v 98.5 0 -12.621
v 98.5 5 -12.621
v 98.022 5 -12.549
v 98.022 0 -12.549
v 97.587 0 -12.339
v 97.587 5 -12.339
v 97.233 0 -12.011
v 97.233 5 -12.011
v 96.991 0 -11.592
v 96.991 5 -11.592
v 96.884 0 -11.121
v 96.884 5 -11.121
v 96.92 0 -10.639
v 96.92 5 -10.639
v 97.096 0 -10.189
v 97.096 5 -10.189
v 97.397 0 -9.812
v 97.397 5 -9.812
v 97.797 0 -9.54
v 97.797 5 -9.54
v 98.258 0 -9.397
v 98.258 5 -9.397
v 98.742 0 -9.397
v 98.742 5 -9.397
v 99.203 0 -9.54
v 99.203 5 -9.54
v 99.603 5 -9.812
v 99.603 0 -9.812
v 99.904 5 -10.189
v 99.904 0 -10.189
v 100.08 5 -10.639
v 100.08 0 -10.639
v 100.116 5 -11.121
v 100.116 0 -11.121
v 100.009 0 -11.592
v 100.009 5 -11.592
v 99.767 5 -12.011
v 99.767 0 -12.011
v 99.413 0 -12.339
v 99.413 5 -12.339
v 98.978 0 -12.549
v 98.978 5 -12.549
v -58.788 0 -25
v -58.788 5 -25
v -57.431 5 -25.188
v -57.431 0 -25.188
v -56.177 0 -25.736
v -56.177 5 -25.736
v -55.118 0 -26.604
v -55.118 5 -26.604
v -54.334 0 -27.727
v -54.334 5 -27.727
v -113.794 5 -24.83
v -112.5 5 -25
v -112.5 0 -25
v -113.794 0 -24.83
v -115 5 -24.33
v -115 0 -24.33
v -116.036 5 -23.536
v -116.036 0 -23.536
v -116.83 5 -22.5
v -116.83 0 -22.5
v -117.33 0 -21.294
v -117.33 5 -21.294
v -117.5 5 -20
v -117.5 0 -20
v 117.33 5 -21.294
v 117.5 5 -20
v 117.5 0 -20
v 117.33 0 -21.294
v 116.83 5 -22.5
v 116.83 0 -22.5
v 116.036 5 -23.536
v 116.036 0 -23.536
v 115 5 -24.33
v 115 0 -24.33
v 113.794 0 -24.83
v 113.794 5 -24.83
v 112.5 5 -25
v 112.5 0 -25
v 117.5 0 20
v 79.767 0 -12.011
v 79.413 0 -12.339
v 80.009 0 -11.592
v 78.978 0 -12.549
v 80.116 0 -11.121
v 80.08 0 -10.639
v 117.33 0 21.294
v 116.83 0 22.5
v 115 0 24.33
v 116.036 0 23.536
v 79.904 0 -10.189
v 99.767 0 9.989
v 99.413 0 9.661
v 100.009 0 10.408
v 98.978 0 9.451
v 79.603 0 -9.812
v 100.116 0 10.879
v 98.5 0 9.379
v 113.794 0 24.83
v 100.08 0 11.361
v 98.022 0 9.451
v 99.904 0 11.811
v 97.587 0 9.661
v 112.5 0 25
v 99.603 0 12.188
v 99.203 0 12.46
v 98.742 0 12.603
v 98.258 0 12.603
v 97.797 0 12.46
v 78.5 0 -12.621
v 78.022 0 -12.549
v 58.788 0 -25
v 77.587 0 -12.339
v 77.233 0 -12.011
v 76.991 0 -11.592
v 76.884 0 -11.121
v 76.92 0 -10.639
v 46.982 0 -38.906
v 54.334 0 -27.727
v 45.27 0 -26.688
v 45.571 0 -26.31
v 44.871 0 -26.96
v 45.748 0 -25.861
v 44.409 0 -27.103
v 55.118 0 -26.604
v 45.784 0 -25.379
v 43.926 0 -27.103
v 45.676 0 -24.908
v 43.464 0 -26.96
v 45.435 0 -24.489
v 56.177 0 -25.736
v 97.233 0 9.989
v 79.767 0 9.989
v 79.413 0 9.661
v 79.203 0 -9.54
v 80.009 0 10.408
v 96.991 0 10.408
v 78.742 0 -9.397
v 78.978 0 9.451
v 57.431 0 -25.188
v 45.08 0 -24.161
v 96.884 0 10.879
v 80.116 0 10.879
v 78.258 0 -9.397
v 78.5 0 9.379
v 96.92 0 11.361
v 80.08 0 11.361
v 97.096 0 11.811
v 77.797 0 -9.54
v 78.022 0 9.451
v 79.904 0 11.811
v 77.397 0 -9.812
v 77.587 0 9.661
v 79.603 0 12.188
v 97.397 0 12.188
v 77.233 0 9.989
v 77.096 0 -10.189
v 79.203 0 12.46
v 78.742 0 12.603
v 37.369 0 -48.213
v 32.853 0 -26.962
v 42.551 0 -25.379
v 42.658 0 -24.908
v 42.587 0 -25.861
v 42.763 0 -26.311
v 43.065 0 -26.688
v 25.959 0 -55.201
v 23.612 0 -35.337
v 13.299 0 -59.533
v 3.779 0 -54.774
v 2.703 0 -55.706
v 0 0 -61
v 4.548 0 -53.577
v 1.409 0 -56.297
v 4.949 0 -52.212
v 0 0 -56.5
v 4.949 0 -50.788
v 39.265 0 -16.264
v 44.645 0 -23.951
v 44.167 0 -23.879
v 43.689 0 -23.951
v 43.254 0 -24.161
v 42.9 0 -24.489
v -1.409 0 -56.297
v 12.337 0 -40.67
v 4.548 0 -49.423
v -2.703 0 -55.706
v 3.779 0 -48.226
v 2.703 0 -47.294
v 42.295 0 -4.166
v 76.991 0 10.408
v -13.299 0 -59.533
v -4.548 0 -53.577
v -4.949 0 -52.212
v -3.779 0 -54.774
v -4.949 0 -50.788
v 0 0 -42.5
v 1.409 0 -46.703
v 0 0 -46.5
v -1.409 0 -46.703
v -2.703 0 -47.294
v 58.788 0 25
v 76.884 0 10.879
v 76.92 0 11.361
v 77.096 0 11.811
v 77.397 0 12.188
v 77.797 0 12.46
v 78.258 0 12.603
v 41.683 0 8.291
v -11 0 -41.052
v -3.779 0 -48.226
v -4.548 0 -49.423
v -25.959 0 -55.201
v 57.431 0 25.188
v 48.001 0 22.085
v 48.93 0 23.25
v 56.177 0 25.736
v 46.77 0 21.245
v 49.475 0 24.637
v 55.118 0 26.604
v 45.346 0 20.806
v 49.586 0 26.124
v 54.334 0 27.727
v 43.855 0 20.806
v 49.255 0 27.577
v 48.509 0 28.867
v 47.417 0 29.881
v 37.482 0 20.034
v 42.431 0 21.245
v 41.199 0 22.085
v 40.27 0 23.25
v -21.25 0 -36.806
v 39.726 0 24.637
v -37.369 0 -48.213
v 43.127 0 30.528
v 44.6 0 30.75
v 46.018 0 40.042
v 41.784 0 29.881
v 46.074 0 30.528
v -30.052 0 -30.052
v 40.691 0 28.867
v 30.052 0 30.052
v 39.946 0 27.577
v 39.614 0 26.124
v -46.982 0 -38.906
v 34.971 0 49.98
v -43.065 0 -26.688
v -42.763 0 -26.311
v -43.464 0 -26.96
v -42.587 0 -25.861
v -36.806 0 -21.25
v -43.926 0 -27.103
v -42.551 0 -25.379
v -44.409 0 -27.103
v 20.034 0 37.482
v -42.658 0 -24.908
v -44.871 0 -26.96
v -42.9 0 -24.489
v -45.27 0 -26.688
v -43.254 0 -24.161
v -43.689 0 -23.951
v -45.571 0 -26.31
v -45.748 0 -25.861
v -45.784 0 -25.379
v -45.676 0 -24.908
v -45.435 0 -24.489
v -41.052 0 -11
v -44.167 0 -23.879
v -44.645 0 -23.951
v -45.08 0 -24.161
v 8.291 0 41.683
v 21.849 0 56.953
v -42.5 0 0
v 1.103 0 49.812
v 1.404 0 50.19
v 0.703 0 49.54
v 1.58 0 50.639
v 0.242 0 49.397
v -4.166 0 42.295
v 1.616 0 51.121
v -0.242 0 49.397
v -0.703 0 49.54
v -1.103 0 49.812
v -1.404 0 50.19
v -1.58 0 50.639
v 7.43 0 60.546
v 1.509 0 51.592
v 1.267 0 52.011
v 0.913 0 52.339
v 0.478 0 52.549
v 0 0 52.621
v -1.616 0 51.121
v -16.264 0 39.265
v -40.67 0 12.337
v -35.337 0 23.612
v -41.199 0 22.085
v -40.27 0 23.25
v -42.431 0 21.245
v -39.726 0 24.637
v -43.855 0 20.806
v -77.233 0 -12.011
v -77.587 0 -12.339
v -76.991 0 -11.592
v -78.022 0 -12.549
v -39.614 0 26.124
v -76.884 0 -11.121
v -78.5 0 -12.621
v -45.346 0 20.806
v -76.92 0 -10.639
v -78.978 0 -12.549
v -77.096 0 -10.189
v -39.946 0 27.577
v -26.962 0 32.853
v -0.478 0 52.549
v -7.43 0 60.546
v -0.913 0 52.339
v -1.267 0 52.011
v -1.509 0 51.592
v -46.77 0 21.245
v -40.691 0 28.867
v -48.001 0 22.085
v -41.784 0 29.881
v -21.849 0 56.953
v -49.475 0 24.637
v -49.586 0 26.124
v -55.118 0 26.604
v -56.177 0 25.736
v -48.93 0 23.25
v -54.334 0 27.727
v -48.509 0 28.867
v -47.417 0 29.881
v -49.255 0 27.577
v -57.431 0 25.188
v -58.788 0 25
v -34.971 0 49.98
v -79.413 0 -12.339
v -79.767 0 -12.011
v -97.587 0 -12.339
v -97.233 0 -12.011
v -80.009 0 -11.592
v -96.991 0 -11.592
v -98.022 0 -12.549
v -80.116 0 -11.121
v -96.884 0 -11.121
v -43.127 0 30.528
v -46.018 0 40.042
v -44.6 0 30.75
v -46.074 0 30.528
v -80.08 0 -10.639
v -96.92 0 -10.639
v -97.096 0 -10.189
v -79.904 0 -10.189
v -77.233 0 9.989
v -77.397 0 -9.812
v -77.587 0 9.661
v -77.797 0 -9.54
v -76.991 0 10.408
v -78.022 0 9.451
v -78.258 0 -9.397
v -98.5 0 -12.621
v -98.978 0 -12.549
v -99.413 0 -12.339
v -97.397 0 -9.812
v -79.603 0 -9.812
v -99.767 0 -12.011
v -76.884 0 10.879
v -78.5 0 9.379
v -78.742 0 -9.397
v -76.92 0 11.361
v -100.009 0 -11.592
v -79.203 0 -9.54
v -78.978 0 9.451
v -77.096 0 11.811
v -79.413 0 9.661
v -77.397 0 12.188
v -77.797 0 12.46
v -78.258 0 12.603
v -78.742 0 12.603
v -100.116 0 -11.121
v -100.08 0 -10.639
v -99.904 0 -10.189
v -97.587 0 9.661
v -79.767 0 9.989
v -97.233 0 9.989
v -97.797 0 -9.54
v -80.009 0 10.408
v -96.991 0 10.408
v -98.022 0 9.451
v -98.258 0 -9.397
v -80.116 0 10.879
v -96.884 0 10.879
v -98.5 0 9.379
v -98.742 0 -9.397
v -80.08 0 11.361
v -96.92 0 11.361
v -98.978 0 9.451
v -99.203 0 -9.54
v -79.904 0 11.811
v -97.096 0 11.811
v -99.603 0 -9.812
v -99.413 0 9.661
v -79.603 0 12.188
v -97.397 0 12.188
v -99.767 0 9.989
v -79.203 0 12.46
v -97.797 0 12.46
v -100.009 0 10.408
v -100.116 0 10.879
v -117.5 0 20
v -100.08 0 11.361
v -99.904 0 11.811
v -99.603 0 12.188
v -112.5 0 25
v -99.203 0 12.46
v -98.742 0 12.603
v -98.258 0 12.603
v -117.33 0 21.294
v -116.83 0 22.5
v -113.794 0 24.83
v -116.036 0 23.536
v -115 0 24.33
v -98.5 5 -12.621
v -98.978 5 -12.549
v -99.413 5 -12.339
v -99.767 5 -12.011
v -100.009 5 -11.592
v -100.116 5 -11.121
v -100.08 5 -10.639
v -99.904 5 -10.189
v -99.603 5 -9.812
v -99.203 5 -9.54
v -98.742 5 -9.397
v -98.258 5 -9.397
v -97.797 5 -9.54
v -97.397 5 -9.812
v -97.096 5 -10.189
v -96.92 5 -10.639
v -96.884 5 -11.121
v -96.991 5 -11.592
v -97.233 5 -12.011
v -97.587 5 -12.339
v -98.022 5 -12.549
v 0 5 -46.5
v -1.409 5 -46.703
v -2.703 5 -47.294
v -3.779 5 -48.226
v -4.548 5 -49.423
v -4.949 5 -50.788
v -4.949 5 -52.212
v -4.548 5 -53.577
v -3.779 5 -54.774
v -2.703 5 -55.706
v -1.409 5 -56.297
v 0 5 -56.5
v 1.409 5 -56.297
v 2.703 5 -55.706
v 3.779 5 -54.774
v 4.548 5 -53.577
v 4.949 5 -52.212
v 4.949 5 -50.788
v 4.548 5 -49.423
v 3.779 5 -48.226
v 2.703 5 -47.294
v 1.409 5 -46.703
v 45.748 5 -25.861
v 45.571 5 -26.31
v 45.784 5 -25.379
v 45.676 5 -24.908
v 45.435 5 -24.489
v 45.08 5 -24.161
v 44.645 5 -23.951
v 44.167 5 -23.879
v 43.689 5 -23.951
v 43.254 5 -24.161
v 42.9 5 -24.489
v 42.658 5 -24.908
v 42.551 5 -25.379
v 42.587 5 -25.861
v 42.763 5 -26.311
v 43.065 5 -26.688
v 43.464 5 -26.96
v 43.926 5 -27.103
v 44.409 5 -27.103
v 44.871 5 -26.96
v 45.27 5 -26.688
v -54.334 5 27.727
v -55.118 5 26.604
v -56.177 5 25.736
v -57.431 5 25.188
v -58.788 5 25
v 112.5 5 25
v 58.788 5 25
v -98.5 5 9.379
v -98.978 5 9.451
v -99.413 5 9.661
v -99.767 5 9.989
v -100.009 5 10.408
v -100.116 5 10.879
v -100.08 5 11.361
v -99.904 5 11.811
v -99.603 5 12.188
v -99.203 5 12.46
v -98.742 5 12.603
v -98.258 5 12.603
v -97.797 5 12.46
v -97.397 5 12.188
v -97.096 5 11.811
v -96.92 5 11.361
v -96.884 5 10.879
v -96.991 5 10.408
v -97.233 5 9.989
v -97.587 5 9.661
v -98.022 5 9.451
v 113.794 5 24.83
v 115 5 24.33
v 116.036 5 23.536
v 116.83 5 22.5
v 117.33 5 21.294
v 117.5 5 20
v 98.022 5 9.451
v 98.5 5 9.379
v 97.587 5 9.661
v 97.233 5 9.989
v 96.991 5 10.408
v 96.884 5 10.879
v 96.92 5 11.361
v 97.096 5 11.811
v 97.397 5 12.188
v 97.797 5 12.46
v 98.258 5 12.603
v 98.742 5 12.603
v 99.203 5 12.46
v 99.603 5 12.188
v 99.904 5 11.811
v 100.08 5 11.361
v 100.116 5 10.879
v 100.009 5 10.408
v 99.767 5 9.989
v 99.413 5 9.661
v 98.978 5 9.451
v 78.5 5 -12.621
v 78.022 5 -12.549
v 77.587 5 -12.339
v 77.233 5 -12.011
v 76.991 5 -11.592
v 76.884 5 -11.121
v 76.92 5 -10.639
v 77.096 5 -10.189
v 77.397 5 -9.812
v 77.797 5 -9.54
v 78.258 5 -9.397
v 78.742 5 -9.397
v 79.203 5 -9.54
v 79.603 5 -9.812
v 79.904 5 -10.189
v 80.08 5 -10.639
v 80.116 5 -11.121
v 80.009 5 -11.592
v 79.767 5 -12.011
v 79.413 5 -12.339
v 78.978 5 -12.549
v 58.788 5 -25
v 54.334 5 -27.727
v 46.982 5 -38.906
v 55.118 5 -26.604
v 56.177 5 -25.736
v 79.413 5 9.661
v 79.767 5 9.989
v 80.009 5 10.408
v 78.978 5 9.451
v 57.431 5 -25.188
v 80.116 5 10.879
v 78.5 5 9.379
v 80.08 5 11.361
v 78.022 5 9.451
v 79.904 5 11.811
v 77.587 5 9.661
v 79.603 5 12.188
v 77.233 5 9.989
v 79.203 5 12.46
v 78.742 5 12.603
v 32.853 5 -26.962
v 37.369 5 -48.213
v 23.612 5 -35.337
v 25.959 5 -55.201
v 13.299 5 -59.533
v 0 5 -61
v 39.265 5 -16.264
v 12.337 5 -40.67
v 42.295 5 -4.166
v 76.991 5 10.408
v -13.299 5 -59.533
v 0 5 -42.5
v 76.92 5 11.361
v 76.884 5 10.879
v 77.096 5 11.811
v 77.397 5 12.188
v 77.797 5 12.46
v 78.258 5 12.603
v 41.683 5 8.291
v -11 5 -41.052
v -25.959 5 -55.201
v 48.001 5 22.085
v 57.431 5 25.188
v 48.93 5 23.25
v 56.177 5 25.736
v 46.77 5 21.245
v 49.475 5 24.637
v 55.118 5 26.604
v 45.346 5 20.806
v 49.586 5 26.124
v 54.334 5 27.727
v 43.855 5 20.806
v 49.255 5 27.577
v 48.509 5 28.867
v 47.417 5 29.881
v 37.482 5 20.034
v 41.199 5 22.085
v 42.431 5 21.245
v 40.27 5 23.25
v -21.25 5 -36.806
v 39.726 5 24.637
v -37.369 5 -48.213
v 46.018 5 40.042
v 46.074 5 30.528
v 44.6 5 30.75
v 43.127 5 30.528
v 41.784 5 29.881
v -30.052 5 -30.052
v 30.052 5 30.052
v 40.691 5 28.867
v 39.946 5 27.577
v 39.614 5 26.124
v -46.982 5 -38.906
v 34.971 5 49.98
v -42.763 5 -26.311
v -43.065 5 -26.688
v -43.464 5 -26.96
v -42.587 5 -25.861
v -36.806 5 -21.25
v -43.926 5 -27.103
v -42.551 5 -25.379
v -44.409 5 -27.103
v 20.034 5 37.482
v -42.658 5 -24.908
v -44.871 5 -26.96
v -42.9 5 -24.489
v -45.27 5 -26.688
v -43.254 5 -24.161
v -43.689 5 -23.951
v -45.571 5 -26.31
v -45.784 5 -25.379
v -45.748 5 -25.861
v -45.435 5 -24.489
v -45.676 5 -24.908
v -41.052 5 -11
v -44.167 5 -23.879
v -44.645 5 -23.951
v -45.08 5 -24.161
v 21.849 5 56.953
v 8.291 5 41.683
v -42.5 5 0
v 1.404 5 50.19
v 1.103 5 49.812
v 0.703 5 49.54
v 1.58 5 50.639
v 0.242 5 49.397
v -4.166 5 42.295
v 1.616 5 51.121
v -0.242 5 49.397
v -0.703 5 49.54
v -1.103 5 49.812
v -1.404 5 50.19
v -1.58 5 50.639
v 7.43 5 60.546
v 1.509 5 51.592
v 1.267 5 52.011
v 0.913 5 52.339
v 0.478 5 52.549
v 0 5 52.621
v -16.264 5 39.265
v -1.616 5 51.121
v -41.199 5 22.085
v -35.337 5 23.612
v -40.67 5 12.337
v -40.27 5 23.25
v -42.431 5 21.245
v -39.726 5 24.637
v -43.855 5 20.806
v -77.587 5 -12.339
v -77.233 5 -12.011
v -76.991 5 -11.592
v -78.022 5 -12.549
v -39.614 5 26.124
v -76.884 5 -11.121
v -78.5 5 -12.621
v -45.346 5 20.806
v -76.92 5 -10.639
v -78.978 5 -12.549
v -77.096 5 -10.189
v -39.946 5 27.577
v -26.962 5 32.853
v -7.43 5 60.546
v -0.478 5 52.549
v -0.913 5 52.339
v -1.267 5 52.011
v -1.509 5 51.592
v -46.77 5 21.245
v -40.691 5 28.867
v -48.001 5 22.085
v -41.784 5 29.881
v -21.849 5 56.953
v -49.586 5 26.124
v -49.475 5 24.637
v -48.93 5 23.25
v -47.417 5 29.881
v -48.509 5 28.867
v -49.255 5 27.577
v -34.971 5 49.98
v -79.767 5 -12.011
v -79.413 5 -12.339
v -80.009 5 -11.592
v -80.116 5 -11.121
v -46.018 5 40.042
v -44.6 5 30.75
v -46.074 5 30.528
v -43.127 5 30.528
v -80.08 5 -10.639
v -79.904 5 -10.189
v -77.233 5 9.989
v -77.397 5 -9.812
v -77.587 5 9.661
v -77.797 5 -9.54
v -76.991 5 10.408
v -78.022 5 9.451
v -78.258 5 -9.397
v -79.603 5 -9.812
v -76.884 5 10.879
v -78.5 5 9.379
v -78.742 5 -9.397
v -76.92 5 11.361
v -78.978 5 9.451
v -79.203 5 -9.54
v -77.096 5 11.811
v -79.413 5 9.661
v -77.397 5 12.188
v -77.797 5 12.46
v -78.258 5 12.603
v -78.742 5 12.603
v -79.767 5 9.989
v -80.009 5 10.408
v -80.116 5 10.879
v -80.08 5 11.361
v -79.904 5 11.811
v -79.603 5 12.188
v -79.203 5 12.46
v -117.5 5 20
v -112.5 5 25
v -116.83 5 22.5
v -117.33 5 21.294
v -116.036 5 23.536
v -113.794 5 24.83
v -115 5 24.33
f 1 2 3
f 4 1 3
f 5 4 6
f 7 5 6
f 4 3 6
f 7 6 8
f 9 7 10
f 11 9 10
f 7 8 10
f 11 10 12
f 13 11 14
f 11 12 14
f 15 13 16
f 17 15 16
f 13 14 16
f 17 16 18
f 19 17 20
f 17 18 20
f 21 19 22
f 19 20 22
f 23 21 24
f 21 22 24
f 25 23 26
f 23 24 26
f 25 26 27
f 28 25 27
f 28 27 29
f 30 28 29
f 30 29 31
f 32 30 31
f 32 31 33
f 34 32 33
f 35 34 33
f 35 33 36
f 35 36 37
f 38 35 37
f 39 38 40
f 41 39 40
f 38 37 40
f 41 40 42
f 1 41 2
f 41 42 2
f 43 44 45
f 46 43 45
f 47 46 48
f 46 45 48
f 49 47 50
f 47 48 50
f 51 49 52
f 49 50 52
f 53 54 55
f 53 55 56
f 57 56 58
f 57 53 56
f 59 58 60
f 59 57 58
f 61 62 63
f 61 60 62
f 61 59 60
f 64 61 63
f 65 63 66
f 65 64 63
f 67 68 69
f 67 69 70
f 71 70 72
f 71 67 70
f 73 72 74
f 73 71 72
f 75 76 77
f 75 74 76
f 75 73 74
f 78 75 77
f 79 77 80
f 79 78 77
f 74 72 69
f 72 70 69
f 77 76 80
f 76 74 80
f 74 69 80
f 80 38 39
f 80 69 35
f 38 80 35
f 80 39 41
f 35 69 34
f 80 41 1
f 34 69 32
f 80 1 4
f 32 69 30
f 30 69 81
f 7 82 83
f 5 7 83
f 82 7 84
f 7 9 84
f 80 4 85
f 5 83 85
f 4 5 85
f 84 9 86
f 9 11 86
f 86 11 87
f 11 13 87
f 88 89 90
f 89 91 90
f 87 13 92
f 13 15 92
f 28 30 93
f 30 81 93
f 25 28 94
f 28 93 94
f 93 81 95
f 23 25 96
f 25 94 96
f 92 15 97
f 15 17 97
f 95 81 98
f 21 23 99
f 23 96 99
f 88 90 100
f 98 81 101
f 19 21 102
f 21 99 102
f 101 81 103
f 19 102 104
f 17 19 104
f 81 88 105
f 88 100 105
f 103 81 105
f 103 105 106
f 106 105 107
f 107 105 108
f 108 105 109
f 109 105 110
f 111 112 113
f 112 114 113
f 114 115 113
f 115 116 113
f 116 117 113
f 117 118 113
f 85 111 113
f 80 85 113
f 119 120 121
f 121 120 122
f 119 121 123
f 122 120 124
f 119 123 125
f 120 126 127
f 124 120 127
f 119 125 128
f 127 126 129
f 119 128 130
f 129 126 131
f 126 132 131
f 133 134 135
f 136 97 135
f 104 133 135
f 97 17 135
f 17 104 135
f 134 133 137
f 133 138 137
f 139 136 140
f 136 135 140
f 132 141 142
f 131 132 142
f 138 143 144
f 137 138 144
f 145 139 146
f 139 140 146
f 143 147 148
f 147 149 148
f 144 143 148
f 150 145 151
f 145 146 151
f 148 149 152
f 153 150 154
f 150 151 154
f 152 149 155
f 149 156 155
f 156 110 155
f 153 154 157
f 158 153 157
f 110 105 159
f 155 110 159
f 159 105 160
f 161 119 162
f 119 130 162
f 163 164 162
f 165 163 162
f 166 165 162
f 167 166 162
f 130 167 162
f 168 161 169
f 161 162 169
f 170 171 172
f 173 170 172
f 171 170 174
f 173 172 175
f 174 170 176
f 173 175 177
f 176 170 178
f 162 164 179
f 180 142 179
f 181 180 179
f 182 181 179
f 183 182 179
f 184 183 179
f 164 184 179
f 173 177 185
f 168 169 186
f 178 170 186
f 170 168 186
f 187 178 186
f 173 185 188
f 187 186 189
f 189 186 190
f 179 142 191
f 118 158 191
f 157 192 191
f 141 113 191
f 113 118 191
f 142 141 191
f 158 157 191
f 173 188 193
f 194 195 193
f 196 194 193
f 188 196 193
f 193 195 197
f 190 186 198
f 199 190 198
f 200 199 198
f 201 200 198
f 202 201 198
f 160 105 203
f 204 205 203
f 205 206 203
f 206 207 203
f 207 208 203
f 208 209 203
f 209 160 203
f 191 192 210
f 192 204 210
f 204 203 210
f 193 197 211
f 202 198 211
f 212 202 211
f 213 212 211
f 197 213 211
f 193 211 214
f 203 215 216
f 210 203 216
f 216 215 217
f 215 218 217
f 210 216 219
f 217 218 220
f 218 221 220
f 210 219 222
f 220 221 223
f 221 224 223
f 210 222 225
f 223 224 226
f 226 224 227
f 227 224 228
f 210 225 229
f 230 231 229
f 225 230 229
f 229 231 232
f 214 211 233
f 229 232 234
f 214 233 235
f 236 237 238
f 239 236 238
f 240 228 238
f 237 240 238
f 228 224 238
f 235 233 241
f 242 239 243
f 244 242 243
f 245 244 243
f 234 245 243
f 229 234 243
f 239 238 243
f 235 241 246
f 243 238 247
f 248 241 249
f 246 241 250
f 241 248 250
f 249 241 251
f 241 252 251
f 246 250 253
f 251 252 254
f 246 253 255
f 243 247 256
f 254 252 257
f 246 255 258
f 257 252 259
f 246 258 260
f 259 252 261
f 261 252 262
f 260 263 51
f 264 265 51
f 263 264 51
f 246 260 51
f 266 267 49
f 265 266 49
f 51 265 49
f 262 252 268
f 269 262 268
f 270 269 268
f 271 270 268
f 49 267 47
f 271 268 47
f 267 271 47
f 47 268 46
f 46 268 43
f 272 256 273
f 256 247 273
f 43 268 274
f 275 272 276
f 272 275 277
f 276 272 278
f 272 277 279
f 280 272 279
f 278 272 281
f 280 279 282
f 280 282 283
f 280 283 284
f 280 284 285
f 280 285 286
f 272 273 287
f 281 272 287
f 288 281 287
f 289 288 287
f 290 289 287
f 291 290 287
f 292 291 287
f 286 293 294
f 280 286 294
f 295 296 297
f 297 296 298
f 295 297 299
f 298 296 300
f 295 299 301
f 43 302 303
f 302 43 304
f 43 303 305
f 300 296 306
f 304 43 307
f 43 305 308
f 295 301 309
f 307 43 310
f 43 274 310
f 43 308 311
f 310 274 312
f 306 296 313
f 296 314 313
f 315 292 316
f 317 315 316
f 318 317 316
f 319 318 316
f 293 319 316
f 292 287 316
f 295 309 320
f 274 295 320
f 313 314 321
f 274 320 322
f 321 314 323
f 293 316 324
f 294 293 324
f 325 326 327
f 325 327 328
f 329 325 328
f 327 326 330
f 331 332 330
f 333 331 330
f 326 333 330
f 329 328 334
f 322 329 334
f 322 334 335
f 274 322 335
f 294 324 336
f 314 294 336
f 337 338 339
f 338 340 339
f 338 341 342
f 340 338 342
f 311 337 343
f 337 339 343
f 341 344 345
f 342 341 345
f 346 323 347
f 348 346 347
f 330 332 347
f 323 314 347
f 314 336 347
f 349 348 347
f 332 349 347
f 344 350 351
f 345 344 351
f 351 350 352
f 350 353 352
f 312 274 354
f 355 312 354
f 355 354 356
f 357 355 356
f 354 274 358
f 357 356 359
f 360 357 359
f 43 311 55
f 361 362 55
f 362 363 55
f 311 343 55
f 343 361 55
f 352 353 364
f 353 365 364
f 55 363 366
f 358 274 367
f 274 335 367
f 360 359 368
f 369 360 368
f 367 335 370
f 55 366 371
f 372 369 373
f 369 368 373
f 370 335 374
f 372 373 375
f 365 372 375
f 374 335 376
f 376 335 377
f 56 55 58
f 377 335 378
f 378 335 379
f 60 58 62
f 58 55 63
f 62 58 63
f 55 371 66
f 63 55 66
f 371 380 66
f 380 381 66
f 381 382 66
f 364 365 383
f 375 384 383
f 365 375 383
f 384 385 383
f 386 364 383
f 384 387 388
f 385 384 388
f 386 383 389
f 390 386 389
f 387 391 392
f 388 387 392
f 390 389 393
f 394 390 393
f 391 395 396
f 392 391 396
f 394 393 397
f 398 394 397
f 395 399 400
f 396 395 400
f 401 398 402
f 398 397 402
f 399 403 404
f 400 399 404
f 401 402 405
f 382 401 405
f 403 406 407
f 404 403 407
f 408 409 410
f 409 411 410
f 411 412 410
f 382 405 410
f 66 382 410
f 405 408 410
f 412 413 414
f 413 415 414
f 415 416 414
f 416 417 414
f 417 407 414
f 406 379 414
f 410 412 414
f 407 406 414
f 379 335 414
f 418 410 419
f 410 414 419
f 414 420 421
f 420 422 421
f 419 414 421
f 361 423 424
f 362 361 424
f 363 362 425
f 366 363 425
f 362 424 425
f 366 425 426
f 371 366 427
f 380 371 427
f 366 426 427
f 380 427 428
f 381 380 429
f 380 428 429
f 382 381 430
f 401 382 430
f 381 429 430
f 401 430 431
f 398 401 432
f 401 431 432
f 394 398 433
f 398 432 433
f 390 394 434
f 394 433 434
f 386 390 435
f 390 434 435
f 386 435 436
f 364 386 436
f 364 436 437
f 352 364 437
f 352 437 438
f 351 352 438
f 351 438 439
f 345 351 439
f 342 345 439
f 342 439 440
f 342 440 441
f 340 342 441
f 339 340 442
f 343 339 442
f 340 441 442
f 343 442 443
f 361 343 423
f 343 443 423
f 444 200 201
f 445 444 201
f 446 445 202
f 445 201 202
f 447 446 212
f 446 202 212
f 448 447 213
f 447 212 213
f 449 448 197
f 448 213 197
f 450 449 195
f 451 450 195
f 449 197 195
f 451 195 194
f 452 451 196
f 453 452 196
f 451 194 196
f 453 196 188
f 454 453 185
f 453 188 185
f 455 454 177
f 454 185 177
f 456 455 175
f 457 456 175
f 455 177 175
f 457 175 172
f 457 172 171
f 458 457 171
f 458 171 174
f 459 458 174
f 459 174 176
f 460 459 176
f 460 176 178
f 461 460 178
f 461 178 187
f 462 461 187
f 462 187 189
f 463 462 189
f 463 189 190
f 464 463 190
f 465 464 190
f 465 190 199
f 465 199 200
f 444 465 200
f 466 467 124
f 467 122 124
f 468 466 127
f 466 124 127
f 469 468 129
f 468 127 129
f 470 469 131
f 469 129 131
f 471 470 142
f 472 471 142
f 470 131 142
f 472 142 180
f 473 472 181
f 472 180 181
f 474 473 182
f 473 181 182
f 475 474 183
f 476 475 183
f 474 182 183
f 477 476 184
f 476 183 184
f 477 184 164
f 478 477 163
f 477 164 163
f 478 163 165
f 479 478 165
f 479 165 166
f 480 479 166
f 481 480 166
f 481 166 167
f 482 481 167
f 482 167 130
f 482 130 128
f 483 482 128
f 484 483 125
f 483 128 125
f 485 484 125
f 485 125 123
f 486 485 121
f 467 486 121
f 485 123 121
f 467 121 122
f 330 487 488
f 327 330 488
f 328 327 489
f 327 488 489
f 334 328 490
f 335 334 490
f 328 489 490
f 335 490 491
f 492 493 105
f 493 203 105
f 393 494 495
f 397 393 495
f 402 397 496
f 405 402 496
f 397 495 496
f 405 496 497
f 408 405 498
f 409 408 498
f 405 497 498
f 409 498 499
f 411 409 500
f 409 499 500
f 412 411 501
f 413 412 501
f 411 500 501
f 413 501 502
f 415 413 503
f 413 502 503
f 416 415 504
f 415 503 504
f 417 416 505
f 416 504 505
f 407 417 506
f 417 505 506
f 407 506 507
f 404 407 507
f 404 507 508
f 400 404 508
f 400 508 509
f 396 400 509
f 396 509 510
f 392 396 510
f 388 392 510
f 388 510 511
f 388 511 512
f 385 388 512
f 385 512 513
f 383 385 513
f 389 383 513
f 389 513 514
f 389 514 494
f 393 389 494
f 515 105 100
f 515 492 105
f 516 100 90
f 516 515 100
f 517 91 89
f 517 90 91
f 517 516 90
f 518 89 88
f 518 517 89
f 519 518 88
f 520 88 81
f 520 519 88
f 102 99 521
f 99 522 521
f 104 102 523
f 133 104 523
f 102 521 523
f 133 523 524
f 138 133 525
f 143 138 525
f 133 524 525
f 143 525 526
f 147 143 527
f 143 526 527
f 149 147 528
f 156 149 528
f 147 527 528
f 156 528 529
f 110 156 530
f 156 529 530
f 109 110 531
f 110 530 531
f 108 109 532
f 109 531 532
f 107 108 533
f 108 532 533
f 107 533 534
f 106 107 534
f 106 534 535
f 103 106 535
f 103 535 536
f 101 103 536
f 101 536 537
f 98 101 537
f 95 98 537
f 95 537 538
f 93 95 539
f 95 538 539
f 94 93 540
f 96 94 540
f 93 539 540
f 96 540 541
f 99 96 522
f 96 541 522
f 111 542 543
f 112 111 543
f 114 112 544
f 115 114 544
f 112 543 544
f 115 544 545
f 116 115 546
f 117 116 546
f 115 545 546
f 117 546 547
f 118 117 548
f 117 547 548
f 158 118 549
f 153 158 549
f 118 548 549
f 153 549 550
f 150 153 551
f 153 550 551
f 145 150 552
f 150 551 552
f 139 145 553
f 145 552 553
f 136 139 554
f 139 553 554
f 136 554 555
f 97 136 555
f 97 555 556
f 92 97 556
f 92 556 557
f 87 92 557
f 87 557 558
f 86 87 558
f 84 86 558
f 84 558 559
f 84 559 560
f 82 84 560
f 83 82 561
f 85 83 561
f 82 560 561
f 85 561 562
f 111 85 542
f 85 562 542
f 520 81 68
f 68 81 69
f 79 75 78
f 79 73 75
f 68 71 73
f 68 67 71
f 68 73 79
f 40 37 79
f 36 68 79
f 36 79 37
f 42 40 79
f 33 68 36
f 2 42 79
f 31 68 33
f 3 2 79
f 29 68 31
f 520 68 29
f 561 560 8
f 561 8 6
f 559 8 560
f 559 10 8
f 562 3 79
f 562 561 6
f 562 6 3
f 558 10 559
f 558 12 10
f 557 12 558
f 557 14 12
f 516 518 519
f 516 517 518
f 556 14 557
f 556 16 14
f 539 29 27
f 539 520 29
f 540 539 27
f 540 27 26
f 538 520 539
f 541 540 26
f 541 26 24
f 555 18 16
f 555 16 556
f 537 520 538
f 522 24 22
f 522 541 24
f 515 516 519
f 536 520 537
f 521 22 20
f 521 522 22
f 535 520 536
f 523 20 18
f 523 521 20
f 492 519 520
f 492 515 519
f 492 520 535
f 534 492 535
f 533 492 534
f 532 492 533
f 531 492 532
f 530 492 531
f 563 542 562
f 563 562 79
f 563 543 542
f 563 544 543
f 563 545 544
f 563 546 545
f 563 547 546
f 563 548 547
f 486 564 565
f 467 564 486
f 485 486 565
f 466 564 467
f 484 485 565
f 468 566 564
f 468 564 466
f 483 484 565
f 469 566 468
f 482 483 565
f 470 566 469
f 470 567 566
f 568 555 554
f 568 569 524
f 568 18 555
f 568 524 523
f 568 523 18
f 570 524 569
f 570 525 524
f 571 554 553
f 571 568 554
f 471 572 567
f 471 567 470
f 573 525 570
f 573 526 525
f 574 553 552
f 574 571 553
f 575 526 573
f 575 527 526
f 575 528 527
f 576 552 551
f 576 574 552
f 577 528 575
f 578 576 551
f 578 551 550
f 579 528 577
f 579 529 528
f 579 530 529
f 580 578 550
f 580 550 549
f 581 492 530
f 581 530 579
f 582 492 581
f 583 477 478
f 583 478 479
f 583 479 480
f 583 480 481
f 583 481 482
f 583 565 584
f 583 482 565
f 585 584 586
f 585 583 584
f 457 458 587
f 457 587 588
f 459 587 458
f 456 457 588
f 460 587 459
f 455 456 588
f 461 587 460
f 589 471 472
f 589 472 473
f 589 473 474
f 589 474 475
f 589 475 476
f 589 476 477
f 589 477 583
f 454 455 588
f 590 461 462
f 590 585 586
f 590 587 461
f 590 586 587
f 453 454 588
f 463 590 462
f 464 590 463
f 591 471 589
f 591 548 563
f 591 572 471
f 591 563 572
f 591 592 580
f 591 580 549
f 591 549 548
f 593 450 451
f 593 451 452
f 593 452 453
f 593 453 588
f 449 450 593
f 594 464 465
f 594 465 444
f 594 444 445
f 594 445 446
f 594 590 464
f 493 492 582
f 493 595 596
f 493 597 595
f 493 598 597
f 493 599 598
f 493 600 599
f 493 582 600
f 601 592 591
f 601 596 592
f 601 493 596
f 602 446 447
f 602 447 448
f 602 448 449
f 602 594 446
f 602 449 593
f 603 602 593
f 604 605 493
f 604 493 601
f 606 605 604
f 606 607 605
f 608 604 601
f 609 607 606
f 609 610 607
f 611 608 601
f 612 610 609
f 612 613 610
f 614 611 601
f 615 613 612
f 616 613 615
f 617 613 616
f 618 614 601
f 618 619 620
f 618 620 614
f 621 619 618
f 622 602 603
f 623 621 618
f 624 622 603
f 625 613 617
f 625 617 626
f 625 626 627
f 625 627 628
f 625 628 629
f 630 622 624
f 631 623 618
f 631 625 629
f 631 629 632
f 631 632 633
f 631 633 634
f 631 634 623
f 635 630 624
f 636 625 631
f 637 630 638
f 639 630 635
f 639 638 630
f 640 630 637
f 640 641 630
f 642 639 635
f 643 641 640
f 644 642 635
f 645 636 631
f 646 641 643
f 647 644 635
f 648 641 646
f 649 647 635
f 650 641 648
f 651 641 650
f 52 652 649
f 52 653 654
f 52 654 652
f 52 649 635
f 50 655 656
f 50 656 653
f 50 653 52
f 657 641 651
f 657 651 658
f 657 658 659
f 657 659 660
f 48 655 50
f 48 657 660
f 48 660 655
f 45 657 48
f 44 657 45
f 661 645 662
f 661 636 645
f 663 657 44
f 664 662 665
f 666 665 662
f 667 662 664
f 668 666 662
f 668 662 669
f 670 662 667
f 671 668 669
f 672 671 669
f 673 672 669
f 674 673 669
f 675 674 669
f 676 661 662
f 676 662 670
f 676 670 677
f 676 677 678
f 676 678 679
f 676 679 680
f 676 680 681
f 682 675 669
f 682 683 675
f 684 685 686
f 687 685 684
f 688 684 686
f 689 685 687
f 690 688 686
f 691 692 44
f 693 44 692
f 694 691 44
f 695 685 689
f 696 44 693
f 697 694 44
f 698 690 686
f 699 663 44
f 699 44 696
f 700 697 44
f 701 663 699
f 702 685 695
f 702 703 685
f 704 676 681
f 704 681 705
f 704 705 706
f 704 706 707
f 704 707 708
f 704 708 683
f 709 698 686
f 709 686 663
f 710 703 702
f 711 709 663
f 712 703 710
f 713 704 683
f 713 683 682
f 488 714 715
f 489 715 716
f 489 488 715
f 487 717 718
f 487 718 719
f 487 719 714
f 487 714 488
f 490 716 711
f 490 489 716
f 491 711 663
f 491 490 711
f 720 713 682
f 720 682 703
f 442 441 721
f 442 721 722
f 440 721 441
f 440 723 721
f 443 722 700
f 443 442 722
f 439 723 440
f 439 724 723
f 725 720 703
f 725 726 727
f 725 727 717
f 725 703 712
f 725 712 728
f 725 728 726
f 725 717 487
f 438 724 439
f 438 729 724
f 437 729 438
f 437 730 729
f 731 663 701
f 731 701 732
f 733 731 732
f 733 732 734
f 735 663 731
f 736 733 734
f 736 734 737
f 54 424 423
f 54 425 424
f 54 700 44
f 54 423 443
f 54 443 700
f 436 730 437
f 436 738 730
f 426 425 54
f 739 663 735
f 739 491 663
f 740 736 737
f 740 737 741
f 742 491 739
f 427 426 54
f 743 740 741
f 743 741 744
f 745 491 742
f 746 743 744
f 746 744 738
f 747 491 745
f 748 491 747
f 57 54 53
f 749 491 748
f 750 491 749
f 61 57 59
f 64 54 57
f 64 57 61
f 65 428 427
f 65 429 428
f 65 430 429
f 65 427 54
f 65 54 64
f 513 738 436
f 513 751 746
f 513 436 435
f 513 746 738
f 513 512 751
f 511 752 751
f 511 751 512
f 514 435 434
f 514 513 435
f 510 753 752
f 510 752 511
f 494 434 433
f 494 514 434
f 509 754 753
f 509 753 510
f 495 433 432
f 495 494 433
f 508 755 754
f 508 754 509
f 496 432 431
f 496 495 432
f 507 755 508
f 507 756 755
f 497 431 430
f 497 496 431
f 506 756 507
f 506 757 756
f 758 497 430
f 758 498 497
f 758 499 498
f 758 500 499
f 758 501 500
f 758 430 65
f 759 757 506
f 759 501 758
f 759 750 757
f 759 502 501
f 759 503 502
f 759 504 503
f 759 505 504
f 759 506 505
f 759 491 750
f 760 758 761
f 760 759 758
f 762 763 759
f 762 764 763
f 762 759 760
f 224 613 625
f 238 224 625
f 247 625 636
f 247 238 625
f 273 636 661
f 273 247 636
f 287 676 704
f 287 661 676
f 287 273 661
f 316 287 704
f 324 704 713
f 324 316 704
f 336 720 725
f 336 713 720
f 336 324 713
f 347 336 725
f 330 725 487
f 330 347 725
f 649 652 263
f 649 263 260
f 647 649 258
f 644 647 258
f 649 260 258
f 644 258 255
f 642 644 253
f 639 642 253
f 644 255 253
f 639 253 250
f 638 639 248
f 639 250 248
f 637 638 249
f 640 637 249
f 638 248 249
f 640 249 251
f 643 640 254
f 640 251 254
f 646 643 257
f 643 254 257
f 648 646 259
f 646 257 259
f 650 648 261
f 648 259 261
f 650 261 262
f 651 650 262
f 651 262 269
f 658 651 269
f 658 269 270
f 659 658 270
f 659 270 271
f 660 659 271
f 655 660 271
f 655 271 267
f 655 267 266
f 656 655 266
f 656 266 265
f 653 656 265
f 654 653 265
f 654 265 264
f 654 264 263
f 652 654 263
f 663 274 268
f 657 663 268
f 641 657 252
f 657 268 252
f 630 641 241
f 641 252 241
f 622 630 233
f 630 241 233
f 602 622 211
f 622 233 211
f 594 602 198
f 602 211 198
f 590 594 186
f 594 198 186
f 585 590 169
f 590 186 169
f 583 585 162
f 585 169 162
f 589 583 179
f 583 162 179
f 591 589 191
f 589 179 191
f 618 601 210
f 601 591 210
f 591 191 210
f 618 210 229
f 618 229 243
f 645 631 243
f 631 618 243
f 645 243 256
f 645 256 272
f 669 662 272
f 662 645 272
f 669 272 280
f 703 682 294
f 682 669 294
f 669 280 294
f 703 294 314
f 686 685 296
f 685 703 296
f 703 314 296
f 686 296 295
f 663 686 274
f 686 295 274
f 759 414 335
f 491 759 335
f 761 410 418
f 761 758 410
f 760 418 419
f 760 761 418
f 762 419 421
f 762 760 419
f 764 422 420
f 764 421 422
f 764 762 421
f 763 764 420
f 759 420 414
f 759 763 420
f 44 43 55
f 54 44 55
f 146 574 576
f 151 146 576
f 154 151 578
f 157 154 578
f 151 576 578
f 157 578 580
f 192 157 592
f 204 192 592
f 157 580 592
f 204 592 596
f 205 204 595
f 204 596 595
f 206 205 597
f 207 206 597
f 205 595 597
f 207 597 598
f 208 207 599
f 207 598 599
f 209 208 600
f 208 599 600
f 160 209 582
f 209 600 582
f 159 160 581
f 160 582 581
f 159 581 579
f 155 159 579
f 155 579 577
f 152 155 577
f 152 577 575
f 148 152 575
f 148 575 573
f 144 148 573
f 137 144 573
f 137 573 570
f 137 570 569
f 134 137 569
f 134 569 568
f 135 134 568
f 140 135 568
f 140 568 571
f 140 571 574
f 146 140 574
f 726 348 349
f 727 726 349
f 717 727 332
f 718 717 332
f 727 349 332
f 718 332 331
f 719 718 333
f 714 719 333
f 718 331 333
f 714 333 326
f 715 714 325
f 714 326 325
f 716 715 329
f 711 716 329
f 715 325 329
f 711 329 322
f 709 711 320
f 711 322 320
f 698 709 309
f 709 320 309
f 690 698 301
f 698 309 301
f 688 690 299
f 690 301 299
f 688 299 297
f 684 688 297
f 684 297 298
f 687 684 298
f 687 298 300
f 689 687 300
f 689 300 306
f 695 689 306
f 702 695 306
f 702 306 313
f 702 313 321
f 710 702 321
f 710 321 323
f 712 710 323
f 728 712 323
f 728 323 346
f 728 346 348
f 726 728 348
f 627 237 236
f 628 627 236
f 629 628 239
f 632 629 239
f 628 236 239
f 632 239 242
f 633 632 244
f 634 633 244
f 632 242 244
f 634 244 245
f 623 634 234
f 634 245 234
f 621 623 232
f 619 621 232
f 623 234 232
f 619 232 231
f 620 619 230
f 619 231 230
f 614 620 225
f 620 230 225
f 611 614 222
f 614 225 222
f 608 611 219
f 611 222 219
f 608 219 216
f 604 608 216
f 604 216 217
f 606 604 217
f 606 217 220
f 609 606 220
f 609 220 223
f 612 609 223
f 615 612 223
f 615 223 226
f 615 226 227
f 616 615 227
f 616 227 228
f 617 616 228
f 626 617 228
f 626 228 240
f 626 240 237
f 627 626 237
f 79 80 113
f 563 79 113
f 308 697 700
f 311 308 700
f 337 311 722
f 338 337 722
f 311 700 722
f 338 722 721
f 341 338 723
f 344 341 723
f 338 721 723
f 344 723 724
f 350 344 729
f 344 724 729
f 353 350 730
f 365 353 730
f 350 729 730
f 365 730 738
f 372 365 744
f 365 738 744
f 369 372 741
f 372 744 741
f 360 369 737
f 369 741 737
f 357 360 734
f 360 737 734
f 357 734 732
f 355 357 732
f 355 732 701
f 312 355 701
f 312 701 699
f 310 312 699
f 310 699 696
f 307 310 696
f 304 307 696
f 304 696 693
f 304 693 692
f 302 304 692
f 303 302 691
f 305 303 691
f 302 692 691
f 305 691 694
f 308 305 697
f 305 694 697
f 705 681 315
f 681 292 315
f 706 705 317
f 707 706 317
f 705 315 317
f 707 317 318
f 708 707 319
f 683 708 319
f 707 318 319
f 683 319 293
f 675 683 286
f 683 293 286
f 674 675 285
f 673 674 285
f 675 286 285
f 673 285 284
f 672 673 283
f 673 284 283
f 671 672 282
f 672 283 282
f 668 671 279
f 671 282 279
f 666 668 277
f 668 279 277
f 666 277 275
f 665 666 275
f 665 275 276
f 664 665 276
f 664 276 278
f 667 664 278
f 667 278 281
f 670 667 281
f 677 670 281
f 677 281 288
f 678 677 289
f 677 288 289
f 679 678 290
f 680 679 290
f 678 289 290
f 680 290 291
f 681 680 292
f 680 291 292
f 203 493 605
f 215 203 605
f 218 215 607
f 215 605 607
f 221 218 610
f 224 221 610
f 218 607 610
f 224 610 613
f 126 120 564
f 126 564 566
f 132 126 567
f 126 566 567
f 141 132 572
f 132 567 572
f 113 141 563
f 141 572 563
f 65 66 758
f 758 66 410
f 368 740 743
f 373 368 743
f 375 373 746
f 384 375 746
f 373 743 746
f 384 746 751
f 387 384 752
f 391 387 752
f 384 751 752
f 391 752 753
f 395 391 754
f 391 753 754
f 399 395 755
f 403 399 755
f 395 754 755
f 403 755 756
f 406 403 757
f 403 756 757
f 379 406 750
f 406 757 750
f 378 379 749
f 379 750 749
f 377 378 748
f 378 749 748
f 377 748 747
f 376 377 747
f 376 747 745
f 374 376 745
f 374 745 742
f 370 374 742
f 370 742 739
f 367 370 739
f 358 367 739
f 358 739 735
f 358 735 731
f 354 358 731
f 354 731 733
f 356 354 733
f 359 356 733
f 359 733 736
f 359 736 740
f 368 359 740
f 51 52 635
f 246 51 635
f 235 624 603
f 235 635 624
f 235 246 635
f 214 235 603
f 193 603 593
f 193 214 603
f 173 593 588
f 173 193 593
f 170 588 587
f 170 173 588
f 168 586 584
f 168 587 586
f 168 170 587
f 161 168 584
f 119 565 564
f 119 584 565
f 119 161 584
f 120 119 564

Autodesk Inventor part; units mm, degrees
ref_plane "YZ Plane" through (0, 0, 0) normal (1, 0, 0) x (0, 1, 0)
ref_plane "XZ Plane" through (0, 0, 0) normal (0, 1, 0) x (-1, 0, 0)
ref_plane "XY Plane" through (0, 0, 0) normal (0, 0, 1) x (1, 0, 0)
sketch "Sketch1" plane through (0, 0, 0) normal (0, 1, 0) x (-1, 0, 0)
  circle A0 centre (0, 0) radius 42.5
  arc A1 (55.6417, 25) -> (-55.6417, 25) centre (0, 0) ccw
  line L0 (0, 0) -> (0, -61)
  line L1 (0, 0) -> (0, 0)
  line L2 (0, 0) -> (0, -90.4875)
  line L3 (-117.5, 25) -> (-117.5, -25)
  line L4 (117.5, -25) -> (117.5, 25)
  line L5 (117.5, 25) -> (-117.5, -25) construction
  line L6 (-117.5, 25) -> (117.5, -25) construction
  line L7 (117.5, 25) -> (55.6417, 25)
  line L8 (-55.6417, 25) -> (-117.5, 25)
  line L9 (55.6417, -25) -> (117.5, -25)
  line L10 (-117.5, -25) -> (-55.6417, -25)
  arc A2 (-55.6417, -25) -> (55.6417, -25) centre (0, 0) ccw
  dimension "d0" = 85
  dimension "d29" = 61
  dimension "d46" = 235
  dimension "d47" = 50
extrude "Extrusion1" add sketch "Sketch1" along normal blind 5
sketch "Sketch2" plane through (0, 0, 0) normal (0, -1, 0) x (1, 0, 0)
  line L0 (-117.5, -25) -> (-117.5, 25) projected
  line L1 (-117.5, 0) -> (117.5, 0)
  line L2 (117.5, 25) -> (117.5, -25) projected
  arc A0 (55.6417, 25) -> (-55.6417, 25) centre (0, 0) ccw projected
  line L3 (0, 61) -> (0, -61)
  arc A1 (-55.6417, -25) -> (55.6417, -25) centre (0, 0) ccw projected
  circle A2 centre (-98.5, 11) radius 2
  line L4 (-117.5, 25) -> (-55.6417, 25) projected
  circle A3 centre (-78.5, 11) radius 2
  circle A4 centre (-98.5, -11) radius 2
  circle A5 centre (-78.5, -11) radius 2
  circle A6 centre (98.5, 11) radius 2
  circle A7 centre (78.5, 11) radius 2
  circle A8 centre (98.5, -11) radius 2
  circle A9 centre (78.5, -11) radius 2
  dimension "d51" = 4
  dimension "d52" = 19
  dimension "d53" = 14
  dimension "d54" = 4
  dimension "d55" = 20
hole "Hole1" at (-98.5, 0, 11) at (-78.5, 0, 11) at (-78.5, 0, -11) at (-98.5, 0, -11) at (78.5, 0, 11) at (98.5, 0, 11) at (98.5, 0, -11) at (78.5, 0, -11) direction (0, 1, 0) diameter 3.242 depth 11.8 tip angle 118 thread size "M4x0.7" class "6H" standard "ANSI Metric M Profile"
fillet "Fillet2" radius 5 8 edges at (-117.5, 2.5, -25) (-55.6417, 2.5, -25) (117.5, 2.5, -25) (55.6417, 2.5, -25) (117.5, 2.5, 25) (55.6417, 2.5, 25) (-55.6417, 2.5, 25) (-117.5, 2.5, 25)
sketch "Sketch4" plane through (0, 5, 0) normal (0, 1, 0) x (1, 0, 0)
  circle A0 centre (0, 0) radius 51.5
  point P0 (0, 51.5)
  point P1 (-44.6003, -25.75)
  point P2 (44.6003, -25.75)
  dimension "d57" = 103
  dimension "d60" = 360
hole "Pins" at (0, 5, -51.5) at (-44.6003, 5, 25.75) at (44.6003, 5, 25.75) direction (0, -1, 0) diameter 10 end through all
sketch "Sketch5" plane through (0, 5, 0) normal (0, 1, 0) x (1, 0, 0)
  circle A0 centre (0, 0) radius 51
  point P0 (0, -51)
  point P1 (0, -51)
  dimension "d69" = 102
hole "Mounting Holes" at (0, 5, 51) direction (0, -1, 0) diameter 3.242 end through all thread size "M4x0.7" class "6H" standard "ANSI Metric M Profile"
pattern_circular "Circular Pattern1" count 3 over 360 about axis through (0, -10, 0) along (0, 1, 0) of "Mounting Holes"
properties part number "Metal Head Thing"
